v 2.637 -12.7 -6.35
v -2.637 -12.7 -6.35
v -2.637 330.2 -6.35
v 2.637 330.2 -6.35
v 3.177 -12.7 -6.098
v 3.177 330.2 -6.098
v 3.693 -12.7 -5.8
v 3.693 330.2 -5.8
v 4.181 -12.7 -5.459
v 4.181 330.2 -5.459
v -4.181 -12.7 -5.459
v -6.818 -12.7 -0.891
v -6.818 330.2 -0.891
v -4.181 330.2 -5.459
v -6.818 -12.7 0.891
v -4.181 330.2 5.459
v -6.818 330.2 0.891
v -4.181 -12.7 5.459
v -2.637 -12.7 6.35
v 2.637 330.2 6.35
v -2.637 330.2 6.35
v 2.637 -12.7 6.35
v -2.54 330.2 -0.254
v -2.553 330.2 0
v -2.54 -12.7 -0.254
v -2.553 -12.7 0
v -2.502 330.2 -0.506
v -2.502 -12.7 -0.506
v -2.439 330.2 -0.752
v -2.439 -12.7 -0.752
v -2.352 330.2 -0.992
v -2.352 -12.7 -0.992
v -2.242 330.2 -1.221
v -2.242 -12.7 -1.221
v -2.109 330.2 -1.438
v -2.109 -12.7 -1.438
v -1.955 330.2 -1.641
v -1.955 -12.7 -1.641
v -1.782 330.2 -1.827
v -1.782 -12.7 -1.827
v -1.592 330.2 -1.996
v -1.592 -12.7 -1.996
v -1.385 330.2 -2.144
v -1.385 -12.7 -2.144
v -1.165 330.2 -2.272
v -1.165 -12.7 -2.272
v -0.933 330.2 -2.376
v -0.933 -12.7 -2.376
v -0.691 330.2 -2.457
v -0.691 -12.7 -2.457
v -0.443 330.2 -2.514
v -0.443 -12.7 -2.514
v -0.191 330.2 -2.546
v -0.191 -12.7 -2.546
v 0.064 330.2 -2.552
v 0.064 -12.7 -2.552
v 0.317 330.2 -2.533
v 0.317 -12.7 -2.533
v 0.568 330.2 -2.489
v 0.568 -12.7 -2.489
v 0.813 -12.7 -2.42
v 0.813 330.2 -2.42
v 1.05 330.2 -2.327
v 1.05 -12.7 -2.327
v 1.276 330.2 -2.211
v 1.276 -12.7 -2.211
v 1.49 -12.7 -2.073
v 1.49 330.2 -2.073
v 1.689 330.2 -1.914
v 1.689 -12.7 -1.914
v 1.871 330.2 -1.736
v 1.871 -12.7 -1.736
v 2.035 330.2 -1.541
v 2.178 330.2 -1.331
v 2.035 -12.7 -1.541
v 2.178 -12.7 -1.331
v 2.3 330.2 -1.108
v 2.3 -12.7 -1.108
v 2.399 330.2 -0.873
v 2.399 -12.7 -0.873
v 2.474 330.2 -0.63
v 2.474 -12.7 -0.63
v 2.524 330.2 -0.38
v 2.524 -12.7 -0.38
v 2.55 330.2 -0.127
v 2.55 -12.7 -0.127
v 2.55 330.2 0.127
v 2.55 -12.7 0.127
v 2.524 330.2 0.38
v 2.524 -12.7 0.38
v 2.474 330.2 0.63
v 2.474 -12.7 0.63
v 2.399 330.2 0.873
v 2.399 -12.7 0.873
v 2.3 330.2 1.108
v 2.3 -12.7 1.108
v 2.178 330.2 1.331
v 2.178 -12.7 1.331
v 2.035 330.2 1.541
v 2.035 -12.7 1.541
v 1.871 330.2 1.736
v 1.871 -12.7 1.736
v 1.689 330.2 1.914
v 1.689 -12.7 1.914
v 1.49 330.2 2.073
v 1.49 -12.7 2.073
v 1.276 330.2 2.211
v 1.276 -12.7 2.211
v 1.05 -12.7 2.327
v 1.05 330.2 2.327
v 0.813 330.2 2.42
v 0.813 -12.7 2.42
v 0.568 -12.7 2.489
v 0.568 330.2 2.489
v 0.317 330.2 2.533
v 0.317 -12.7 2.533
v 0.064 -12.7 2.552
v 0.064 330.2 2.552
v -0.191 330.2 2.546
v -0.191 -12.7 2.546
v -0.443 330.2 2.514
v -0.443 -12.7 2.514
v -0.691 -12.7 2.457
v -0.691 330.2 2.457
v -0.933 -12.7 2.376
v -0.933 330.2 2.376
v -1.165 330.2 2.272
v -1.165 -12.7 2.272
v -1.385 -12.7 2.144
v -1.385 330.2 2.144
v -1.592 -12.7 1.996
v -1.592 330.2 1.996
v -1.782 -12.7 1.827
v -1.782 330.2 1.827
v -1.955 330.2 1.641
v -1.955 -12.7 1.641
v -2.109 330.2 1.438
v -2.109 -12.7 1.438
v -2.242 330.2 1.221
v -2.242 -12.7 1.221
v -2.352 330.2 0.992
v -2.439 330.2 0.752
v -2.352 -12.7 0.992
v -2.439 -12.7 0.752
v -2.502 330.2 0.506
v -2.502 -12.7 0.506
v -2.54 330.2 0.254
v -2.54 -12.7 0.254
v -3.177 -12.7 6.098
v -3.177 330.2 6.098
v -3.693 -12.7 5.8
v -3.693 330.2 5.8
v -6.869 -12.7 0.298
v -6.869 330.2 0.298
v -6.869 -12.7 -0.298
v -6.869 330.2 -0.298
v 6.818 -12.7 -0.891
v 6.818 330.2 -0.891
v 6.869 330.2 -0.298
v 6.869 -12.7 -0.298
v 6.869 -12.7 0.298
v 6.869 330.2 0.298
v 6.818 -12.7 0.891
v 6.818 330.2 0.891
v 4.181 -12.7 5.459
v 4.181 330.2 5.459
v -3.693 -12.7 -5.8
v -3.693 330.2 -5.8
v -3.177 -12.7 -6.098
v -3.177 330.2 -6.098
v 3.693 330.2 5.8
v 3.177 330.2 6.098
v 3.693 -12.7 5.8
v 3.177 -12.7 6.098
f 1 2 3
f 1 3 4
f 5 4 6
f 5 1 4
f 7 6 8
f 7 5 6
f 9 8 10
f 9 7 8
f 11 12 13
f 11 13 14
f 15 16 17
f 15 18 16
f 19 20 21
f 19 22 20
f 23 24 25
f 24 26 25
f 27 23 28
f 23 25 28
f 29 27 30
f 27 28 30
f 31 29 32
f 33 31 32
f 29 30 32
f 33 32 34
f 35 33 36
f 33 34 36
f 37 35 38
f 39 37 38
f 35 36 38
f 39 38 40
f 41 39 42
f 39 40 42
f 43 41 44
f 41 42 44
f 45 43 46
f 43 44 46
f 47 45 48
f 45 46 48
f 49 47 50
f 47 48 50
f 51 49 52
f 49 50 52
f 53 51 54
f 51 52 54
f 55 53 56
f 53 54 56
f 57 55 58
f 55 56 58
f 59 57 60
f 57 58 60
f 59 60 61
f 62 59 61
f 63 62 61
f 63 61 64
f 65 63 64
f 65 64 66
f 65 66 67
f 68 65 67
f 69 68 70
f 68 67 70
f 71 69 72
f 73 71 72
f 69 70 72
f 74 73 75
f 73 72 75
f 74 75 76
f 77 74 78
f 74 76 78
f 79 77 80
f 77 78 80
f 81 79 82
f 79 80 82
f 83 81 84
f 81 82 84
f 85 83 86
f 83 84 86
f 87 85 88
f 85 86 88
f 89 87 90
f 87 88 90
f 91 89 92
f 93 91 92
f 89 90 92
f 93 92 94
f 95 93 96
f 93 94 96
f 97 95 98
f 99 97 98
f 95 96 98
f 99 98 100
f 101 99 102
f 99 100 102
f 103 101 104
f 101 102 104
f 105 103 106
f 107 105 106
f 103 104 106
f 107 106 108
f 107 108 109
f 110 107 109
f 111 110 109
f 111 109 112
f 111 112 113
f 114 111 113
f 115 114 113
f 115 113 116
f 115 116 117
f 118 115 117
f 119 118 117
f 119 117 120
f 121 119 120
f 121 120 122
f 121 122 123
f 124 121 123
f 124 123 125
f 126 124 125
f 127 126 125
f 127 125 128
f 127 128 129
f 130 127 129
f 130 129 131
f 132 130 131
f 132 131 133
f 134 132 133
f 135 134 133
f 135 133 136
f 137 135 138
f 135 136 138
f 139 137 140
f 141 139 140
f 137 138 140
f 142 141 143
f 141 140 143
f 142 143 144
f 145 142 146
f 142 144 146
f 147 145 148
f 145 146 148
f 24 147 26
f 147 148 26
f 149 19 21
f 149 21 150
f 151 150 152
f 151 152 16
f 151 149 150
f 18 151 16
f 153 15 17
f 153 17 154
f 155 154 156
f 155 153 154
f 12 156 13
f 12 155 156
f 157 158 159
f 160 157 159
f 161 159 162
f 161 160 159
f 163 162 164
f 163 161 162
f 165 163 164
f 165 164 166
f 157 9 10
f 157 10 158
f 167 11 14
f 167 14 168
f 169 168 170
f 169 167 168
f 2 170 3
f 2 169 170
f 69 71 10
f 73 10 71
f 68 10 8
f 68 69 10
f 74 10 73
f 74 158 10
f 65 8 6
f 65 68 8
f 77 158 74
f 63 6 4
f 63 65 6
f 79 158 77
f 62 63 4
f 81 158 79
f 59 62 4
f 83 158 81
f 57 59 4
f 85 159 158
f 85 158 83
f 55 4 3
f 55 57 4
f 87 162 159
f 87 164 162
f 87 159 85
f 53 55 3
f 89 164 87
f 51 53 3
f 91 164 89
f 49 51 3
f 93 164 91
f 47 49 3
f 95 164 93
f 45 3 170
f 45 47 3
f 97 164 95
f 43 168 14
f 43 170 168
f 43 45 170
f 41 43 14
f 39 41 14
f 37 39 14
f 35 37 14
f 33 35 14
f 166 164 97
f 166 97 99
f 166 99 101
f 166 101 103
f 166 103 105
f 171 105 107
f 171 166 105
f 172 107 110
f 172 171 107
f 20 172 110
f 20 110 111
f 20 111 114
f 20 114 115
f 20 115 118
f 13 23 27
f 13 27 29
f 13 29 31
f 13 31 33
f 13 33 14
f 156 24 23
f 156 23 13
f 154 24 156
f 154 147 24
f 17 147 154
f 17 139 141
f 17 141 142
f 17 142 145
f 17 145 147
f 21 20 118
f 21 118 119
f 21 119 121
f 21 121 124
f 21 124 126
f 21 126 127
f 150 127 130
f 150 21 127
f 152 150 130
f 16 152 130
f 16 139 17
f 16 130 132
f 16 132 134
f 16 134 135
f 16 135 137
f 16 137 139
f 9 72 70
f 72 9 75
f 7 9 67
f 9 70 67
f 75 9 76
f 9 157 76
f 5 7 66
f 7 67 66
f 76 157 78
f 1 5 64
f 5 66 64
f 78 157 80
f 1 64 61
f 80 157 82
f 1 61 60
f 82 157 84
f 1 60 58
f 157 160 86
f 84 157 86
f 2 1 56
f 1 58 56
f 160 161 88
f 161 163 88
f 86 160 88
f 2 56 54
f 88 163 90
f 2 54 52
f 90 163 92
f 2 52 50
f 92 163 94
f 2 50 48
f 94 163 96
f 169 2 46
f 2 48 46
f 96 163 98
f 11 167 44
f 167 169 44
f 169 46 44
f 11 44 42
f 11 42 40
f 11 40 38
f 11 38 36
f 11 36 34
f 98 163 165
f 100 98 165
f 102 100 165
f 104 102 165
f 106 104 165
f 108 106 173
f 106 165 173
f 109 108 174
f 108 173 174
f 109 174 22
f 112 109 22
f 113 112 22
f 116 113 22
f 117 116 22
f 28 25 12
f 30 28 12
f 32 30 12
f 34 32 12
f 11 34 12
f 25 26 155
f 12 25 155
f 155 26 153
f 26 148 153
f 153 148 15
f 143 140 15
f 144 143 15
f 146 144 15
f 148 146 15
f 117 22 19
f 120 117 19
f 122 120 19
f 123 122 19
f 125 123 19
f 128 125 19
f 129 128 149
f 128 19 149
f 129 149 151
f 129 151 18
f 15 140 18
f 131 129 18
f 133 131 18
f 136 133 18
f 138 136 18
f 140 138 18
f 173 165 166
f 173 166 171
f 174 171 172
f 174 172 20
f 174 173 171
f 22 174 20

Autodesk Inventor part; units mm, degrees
ref_plane "YZ Plane" through (0, 0, 0) normal (1, 0, 0) x (0, 1, 0)
ref_plane "XZ Plane" through (0, 0, 0) normal (0, 1, 0) x (-1, 0, 0)
ref_plane "XY Plane" through (0, 0, 0) normal (0, 0, 1) x (1, 0, 0)
sketch "Sketch1" plane through (0, 0, 0) normal (0, 1, 0) x (-1, 0, 0)
  line L0 (7.3323, 0) -> (3.6662, -6.35)
  line L1 (3.6662, -6.35) -> (-3.6662, -6.35)
  line L2 (-3.6662, -6.35) -> (-7.3323, 0)
  line L3 (-7.3323, 0) -> (-3.6662, 6.35)
  line L4 (-3.6662, 6.35) -> (3.6662, 6.35)
  line L5 (3.6662, 6.35) -> (7.3323, 0)
  circle A0 centre (0, 0) radius 2.5527
  circle A1 centre (0, 0) radius 6.8758
  point P0 (2.637, -6.35)
  point P1 (4.1808, -5.4587)
  point P2 (6.8178, -0.8913)
  point P3 (6.8178, 0.8913)
  point P4 (4.1808, 5.4587)
  point P5 (2.637, 6.35)
  point P6 (-2.637, 6.35)
  point P7 (-4.1808, 5.4587)
  point P8 (-6.8178, 0.8913)
  point P9 (-6.8178, -0.8913)
  point P10 (-4.1808, -5.4587)
  point P11 (-2.637, -6.35)
  dimension "d0" = 6.35
  dimension "d1" = 5.1054
  dimension "d2" = 13.7516
extrude "Extrusion1" add sketch "Sketch1" along normal blind 317.5 contours L0 A1 L1 L2 L3 L4 L5
move faces "Move1" translate (0, 12.7, 0) faces at (-0.1026, 317.5, -5.078)
move faces "Move2" translate (0, -12.7, 0) faces at (-0.1026, 0, -5.078)
properties part number "thunder hex 13in"
